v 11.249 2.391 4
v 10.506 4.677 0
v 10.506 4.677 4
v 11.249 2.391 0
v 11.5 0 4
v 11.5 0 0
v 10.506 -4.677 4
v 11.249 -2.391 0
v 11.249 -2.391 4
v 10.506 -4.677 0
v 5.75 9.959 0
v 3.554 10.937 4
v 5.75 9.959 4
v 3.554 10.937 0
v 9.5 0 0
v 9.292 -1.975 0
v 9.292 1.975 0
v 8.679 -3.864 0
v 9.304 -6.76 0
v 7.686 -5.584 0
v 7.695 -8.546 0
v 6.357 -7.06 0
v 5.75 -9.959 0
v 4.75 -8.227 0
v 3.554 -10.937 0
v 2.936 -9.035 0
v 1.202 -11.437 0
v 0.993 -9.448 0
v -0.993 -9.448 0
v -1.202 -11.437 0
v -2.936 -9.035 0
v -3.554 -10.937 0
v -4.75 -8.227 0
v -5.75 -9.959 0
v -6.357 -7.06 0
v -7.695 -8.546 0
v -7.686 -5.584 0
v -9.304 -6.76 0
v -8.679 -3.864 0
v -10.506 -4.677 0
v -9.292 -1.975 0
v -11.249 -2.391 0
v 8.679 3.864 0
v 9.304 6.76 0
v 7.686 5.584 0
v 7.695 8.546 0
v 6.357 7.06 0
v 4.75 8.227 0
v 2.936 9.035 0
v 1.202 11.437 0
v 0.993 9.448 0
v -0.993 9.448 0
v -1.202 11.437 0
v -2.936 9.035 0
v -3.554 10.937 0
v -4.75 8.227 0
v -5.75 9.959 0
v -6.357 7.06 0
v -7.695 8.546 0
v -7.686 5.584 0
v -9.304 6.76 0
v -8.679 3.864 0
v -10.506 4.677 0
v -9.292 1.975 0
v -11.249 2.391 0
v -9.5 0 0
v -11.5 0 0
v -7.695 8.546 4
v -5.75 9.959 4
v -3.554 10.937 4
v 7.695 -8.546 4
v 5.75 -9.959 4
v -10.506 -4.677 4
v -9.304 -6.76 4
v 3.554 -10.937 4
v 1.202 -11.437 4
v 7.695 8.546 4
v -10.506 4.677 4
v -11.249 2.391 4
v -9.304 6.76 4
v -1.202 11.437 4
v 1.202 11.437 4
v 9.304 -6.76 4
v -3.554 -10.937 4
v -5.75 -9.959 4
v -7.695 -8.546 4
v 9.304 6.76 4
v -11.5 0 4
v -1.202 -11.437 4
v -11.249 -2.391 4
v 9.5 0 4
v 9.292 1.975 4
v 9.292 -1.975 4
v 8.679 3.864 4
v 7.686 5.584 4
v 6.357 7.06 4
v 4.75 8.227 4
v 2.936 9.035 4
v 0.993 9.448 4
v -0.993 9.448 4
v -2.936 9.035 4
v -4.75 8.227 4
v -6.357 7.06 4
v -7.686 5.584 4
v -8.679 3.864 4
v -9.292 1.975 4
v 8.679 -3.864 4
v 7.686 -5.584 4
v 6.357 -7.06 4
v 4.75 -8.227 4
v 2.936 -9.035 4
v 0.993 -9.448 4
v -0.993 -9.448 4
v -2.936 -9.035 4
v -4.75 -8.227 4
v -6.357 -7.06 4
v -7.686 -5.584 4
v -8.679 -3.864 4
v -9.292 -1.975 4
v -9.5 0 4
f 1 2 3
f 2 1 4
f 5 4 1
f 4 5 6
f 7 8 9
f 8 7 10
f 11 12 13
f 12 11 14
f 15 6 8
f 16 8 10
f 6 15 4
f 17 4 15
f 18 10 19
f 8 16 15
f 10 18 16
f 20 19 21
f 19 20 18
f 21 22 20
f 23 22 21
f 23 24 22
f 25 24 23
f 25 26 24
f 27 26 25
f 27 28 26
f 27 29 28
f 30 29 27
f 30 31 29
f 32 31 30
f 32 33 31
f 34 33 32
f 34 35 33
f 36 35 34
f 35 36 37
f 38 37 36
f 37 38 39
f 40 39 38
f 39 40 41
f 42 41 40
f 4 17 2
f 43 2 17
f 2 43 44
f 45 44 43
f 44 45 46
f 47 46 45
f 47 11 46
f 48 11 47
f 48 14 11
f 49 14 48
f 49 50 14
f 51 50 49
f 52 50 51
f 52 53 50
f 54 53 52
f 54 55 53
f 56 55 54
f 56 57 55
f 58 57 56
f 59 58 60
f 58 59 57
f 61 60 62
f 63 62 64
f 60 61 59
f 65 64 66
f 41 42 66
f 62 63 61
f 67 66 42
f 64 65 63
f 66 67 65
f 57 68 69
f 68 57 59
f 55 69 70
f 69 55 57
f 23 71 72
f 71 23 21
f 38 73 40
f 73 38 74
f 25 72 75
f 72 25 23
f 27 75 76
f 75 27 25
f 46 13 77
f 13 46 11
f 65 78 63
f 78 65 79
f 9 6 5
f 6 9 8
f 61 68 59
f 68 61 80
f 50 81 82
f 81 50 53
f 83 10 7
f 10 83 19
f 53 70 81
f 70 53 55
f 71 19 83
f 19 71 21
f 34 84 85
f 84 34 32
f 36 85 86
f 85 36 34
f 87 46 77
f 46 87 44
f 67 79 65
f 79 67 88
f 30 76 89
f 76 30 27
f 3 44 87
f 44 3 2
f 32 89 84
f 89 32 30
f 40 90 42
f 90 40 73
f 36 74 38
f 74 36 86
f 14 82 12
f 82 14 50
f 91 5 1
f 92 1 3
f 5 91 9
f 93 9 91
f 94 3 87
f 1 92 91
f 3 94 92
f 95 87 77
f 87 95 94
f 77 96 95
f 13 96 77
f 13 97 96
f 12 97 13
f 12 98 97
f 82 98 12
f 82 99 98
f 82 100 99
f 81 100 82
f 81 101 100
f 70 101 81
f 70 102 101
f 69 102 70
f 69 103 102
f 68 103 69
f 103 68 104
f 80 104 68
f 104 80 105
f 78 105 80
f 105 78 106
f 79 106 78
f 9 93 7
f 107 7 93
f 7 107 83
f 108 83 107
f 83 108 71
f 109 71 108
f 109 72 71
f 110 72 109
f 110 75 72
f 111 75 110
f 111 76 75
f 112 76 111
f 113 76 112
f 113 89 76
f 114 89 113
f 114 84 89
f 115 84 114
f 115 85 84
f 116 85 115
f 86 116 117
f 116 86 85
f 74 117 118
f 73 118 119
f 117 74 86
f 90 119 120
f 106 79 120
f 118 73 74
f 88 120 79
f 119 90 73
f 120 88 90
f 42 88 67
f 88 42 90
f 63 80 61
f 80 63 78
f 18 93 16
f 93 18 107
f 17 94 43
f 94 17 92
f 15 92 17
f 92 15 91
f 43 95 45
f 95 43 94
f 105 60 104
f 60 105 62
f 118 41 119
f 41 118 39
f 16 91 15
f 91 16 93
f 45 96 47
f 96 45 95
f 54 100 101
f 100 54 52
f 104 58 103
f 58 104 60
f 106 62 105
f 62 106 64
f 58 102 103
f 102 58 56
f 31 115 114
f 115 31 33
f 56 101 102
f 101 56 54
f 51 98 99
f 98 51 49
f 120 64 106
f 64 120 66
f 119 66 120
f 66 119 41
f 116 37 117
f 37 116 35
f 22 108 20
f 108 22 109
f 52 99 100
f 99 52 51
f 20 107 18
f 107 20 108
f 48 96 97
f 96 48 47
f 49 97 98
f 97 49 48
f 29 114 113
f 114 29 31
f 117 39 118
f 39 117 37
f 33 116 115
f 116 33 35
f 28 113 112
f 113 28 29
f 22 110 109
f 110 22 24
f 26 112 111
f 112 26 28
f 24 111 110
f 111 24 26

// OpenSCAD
inner_dia = 19;
outer_dia = inner_dia + 4;
z = [0, 0, 1];


difference() {
    cylinder(4, r=outer_dia/2);

    translate(-z * 0.25)
    cylinder(
        4.5, r=inner_dia/2
    );
}
